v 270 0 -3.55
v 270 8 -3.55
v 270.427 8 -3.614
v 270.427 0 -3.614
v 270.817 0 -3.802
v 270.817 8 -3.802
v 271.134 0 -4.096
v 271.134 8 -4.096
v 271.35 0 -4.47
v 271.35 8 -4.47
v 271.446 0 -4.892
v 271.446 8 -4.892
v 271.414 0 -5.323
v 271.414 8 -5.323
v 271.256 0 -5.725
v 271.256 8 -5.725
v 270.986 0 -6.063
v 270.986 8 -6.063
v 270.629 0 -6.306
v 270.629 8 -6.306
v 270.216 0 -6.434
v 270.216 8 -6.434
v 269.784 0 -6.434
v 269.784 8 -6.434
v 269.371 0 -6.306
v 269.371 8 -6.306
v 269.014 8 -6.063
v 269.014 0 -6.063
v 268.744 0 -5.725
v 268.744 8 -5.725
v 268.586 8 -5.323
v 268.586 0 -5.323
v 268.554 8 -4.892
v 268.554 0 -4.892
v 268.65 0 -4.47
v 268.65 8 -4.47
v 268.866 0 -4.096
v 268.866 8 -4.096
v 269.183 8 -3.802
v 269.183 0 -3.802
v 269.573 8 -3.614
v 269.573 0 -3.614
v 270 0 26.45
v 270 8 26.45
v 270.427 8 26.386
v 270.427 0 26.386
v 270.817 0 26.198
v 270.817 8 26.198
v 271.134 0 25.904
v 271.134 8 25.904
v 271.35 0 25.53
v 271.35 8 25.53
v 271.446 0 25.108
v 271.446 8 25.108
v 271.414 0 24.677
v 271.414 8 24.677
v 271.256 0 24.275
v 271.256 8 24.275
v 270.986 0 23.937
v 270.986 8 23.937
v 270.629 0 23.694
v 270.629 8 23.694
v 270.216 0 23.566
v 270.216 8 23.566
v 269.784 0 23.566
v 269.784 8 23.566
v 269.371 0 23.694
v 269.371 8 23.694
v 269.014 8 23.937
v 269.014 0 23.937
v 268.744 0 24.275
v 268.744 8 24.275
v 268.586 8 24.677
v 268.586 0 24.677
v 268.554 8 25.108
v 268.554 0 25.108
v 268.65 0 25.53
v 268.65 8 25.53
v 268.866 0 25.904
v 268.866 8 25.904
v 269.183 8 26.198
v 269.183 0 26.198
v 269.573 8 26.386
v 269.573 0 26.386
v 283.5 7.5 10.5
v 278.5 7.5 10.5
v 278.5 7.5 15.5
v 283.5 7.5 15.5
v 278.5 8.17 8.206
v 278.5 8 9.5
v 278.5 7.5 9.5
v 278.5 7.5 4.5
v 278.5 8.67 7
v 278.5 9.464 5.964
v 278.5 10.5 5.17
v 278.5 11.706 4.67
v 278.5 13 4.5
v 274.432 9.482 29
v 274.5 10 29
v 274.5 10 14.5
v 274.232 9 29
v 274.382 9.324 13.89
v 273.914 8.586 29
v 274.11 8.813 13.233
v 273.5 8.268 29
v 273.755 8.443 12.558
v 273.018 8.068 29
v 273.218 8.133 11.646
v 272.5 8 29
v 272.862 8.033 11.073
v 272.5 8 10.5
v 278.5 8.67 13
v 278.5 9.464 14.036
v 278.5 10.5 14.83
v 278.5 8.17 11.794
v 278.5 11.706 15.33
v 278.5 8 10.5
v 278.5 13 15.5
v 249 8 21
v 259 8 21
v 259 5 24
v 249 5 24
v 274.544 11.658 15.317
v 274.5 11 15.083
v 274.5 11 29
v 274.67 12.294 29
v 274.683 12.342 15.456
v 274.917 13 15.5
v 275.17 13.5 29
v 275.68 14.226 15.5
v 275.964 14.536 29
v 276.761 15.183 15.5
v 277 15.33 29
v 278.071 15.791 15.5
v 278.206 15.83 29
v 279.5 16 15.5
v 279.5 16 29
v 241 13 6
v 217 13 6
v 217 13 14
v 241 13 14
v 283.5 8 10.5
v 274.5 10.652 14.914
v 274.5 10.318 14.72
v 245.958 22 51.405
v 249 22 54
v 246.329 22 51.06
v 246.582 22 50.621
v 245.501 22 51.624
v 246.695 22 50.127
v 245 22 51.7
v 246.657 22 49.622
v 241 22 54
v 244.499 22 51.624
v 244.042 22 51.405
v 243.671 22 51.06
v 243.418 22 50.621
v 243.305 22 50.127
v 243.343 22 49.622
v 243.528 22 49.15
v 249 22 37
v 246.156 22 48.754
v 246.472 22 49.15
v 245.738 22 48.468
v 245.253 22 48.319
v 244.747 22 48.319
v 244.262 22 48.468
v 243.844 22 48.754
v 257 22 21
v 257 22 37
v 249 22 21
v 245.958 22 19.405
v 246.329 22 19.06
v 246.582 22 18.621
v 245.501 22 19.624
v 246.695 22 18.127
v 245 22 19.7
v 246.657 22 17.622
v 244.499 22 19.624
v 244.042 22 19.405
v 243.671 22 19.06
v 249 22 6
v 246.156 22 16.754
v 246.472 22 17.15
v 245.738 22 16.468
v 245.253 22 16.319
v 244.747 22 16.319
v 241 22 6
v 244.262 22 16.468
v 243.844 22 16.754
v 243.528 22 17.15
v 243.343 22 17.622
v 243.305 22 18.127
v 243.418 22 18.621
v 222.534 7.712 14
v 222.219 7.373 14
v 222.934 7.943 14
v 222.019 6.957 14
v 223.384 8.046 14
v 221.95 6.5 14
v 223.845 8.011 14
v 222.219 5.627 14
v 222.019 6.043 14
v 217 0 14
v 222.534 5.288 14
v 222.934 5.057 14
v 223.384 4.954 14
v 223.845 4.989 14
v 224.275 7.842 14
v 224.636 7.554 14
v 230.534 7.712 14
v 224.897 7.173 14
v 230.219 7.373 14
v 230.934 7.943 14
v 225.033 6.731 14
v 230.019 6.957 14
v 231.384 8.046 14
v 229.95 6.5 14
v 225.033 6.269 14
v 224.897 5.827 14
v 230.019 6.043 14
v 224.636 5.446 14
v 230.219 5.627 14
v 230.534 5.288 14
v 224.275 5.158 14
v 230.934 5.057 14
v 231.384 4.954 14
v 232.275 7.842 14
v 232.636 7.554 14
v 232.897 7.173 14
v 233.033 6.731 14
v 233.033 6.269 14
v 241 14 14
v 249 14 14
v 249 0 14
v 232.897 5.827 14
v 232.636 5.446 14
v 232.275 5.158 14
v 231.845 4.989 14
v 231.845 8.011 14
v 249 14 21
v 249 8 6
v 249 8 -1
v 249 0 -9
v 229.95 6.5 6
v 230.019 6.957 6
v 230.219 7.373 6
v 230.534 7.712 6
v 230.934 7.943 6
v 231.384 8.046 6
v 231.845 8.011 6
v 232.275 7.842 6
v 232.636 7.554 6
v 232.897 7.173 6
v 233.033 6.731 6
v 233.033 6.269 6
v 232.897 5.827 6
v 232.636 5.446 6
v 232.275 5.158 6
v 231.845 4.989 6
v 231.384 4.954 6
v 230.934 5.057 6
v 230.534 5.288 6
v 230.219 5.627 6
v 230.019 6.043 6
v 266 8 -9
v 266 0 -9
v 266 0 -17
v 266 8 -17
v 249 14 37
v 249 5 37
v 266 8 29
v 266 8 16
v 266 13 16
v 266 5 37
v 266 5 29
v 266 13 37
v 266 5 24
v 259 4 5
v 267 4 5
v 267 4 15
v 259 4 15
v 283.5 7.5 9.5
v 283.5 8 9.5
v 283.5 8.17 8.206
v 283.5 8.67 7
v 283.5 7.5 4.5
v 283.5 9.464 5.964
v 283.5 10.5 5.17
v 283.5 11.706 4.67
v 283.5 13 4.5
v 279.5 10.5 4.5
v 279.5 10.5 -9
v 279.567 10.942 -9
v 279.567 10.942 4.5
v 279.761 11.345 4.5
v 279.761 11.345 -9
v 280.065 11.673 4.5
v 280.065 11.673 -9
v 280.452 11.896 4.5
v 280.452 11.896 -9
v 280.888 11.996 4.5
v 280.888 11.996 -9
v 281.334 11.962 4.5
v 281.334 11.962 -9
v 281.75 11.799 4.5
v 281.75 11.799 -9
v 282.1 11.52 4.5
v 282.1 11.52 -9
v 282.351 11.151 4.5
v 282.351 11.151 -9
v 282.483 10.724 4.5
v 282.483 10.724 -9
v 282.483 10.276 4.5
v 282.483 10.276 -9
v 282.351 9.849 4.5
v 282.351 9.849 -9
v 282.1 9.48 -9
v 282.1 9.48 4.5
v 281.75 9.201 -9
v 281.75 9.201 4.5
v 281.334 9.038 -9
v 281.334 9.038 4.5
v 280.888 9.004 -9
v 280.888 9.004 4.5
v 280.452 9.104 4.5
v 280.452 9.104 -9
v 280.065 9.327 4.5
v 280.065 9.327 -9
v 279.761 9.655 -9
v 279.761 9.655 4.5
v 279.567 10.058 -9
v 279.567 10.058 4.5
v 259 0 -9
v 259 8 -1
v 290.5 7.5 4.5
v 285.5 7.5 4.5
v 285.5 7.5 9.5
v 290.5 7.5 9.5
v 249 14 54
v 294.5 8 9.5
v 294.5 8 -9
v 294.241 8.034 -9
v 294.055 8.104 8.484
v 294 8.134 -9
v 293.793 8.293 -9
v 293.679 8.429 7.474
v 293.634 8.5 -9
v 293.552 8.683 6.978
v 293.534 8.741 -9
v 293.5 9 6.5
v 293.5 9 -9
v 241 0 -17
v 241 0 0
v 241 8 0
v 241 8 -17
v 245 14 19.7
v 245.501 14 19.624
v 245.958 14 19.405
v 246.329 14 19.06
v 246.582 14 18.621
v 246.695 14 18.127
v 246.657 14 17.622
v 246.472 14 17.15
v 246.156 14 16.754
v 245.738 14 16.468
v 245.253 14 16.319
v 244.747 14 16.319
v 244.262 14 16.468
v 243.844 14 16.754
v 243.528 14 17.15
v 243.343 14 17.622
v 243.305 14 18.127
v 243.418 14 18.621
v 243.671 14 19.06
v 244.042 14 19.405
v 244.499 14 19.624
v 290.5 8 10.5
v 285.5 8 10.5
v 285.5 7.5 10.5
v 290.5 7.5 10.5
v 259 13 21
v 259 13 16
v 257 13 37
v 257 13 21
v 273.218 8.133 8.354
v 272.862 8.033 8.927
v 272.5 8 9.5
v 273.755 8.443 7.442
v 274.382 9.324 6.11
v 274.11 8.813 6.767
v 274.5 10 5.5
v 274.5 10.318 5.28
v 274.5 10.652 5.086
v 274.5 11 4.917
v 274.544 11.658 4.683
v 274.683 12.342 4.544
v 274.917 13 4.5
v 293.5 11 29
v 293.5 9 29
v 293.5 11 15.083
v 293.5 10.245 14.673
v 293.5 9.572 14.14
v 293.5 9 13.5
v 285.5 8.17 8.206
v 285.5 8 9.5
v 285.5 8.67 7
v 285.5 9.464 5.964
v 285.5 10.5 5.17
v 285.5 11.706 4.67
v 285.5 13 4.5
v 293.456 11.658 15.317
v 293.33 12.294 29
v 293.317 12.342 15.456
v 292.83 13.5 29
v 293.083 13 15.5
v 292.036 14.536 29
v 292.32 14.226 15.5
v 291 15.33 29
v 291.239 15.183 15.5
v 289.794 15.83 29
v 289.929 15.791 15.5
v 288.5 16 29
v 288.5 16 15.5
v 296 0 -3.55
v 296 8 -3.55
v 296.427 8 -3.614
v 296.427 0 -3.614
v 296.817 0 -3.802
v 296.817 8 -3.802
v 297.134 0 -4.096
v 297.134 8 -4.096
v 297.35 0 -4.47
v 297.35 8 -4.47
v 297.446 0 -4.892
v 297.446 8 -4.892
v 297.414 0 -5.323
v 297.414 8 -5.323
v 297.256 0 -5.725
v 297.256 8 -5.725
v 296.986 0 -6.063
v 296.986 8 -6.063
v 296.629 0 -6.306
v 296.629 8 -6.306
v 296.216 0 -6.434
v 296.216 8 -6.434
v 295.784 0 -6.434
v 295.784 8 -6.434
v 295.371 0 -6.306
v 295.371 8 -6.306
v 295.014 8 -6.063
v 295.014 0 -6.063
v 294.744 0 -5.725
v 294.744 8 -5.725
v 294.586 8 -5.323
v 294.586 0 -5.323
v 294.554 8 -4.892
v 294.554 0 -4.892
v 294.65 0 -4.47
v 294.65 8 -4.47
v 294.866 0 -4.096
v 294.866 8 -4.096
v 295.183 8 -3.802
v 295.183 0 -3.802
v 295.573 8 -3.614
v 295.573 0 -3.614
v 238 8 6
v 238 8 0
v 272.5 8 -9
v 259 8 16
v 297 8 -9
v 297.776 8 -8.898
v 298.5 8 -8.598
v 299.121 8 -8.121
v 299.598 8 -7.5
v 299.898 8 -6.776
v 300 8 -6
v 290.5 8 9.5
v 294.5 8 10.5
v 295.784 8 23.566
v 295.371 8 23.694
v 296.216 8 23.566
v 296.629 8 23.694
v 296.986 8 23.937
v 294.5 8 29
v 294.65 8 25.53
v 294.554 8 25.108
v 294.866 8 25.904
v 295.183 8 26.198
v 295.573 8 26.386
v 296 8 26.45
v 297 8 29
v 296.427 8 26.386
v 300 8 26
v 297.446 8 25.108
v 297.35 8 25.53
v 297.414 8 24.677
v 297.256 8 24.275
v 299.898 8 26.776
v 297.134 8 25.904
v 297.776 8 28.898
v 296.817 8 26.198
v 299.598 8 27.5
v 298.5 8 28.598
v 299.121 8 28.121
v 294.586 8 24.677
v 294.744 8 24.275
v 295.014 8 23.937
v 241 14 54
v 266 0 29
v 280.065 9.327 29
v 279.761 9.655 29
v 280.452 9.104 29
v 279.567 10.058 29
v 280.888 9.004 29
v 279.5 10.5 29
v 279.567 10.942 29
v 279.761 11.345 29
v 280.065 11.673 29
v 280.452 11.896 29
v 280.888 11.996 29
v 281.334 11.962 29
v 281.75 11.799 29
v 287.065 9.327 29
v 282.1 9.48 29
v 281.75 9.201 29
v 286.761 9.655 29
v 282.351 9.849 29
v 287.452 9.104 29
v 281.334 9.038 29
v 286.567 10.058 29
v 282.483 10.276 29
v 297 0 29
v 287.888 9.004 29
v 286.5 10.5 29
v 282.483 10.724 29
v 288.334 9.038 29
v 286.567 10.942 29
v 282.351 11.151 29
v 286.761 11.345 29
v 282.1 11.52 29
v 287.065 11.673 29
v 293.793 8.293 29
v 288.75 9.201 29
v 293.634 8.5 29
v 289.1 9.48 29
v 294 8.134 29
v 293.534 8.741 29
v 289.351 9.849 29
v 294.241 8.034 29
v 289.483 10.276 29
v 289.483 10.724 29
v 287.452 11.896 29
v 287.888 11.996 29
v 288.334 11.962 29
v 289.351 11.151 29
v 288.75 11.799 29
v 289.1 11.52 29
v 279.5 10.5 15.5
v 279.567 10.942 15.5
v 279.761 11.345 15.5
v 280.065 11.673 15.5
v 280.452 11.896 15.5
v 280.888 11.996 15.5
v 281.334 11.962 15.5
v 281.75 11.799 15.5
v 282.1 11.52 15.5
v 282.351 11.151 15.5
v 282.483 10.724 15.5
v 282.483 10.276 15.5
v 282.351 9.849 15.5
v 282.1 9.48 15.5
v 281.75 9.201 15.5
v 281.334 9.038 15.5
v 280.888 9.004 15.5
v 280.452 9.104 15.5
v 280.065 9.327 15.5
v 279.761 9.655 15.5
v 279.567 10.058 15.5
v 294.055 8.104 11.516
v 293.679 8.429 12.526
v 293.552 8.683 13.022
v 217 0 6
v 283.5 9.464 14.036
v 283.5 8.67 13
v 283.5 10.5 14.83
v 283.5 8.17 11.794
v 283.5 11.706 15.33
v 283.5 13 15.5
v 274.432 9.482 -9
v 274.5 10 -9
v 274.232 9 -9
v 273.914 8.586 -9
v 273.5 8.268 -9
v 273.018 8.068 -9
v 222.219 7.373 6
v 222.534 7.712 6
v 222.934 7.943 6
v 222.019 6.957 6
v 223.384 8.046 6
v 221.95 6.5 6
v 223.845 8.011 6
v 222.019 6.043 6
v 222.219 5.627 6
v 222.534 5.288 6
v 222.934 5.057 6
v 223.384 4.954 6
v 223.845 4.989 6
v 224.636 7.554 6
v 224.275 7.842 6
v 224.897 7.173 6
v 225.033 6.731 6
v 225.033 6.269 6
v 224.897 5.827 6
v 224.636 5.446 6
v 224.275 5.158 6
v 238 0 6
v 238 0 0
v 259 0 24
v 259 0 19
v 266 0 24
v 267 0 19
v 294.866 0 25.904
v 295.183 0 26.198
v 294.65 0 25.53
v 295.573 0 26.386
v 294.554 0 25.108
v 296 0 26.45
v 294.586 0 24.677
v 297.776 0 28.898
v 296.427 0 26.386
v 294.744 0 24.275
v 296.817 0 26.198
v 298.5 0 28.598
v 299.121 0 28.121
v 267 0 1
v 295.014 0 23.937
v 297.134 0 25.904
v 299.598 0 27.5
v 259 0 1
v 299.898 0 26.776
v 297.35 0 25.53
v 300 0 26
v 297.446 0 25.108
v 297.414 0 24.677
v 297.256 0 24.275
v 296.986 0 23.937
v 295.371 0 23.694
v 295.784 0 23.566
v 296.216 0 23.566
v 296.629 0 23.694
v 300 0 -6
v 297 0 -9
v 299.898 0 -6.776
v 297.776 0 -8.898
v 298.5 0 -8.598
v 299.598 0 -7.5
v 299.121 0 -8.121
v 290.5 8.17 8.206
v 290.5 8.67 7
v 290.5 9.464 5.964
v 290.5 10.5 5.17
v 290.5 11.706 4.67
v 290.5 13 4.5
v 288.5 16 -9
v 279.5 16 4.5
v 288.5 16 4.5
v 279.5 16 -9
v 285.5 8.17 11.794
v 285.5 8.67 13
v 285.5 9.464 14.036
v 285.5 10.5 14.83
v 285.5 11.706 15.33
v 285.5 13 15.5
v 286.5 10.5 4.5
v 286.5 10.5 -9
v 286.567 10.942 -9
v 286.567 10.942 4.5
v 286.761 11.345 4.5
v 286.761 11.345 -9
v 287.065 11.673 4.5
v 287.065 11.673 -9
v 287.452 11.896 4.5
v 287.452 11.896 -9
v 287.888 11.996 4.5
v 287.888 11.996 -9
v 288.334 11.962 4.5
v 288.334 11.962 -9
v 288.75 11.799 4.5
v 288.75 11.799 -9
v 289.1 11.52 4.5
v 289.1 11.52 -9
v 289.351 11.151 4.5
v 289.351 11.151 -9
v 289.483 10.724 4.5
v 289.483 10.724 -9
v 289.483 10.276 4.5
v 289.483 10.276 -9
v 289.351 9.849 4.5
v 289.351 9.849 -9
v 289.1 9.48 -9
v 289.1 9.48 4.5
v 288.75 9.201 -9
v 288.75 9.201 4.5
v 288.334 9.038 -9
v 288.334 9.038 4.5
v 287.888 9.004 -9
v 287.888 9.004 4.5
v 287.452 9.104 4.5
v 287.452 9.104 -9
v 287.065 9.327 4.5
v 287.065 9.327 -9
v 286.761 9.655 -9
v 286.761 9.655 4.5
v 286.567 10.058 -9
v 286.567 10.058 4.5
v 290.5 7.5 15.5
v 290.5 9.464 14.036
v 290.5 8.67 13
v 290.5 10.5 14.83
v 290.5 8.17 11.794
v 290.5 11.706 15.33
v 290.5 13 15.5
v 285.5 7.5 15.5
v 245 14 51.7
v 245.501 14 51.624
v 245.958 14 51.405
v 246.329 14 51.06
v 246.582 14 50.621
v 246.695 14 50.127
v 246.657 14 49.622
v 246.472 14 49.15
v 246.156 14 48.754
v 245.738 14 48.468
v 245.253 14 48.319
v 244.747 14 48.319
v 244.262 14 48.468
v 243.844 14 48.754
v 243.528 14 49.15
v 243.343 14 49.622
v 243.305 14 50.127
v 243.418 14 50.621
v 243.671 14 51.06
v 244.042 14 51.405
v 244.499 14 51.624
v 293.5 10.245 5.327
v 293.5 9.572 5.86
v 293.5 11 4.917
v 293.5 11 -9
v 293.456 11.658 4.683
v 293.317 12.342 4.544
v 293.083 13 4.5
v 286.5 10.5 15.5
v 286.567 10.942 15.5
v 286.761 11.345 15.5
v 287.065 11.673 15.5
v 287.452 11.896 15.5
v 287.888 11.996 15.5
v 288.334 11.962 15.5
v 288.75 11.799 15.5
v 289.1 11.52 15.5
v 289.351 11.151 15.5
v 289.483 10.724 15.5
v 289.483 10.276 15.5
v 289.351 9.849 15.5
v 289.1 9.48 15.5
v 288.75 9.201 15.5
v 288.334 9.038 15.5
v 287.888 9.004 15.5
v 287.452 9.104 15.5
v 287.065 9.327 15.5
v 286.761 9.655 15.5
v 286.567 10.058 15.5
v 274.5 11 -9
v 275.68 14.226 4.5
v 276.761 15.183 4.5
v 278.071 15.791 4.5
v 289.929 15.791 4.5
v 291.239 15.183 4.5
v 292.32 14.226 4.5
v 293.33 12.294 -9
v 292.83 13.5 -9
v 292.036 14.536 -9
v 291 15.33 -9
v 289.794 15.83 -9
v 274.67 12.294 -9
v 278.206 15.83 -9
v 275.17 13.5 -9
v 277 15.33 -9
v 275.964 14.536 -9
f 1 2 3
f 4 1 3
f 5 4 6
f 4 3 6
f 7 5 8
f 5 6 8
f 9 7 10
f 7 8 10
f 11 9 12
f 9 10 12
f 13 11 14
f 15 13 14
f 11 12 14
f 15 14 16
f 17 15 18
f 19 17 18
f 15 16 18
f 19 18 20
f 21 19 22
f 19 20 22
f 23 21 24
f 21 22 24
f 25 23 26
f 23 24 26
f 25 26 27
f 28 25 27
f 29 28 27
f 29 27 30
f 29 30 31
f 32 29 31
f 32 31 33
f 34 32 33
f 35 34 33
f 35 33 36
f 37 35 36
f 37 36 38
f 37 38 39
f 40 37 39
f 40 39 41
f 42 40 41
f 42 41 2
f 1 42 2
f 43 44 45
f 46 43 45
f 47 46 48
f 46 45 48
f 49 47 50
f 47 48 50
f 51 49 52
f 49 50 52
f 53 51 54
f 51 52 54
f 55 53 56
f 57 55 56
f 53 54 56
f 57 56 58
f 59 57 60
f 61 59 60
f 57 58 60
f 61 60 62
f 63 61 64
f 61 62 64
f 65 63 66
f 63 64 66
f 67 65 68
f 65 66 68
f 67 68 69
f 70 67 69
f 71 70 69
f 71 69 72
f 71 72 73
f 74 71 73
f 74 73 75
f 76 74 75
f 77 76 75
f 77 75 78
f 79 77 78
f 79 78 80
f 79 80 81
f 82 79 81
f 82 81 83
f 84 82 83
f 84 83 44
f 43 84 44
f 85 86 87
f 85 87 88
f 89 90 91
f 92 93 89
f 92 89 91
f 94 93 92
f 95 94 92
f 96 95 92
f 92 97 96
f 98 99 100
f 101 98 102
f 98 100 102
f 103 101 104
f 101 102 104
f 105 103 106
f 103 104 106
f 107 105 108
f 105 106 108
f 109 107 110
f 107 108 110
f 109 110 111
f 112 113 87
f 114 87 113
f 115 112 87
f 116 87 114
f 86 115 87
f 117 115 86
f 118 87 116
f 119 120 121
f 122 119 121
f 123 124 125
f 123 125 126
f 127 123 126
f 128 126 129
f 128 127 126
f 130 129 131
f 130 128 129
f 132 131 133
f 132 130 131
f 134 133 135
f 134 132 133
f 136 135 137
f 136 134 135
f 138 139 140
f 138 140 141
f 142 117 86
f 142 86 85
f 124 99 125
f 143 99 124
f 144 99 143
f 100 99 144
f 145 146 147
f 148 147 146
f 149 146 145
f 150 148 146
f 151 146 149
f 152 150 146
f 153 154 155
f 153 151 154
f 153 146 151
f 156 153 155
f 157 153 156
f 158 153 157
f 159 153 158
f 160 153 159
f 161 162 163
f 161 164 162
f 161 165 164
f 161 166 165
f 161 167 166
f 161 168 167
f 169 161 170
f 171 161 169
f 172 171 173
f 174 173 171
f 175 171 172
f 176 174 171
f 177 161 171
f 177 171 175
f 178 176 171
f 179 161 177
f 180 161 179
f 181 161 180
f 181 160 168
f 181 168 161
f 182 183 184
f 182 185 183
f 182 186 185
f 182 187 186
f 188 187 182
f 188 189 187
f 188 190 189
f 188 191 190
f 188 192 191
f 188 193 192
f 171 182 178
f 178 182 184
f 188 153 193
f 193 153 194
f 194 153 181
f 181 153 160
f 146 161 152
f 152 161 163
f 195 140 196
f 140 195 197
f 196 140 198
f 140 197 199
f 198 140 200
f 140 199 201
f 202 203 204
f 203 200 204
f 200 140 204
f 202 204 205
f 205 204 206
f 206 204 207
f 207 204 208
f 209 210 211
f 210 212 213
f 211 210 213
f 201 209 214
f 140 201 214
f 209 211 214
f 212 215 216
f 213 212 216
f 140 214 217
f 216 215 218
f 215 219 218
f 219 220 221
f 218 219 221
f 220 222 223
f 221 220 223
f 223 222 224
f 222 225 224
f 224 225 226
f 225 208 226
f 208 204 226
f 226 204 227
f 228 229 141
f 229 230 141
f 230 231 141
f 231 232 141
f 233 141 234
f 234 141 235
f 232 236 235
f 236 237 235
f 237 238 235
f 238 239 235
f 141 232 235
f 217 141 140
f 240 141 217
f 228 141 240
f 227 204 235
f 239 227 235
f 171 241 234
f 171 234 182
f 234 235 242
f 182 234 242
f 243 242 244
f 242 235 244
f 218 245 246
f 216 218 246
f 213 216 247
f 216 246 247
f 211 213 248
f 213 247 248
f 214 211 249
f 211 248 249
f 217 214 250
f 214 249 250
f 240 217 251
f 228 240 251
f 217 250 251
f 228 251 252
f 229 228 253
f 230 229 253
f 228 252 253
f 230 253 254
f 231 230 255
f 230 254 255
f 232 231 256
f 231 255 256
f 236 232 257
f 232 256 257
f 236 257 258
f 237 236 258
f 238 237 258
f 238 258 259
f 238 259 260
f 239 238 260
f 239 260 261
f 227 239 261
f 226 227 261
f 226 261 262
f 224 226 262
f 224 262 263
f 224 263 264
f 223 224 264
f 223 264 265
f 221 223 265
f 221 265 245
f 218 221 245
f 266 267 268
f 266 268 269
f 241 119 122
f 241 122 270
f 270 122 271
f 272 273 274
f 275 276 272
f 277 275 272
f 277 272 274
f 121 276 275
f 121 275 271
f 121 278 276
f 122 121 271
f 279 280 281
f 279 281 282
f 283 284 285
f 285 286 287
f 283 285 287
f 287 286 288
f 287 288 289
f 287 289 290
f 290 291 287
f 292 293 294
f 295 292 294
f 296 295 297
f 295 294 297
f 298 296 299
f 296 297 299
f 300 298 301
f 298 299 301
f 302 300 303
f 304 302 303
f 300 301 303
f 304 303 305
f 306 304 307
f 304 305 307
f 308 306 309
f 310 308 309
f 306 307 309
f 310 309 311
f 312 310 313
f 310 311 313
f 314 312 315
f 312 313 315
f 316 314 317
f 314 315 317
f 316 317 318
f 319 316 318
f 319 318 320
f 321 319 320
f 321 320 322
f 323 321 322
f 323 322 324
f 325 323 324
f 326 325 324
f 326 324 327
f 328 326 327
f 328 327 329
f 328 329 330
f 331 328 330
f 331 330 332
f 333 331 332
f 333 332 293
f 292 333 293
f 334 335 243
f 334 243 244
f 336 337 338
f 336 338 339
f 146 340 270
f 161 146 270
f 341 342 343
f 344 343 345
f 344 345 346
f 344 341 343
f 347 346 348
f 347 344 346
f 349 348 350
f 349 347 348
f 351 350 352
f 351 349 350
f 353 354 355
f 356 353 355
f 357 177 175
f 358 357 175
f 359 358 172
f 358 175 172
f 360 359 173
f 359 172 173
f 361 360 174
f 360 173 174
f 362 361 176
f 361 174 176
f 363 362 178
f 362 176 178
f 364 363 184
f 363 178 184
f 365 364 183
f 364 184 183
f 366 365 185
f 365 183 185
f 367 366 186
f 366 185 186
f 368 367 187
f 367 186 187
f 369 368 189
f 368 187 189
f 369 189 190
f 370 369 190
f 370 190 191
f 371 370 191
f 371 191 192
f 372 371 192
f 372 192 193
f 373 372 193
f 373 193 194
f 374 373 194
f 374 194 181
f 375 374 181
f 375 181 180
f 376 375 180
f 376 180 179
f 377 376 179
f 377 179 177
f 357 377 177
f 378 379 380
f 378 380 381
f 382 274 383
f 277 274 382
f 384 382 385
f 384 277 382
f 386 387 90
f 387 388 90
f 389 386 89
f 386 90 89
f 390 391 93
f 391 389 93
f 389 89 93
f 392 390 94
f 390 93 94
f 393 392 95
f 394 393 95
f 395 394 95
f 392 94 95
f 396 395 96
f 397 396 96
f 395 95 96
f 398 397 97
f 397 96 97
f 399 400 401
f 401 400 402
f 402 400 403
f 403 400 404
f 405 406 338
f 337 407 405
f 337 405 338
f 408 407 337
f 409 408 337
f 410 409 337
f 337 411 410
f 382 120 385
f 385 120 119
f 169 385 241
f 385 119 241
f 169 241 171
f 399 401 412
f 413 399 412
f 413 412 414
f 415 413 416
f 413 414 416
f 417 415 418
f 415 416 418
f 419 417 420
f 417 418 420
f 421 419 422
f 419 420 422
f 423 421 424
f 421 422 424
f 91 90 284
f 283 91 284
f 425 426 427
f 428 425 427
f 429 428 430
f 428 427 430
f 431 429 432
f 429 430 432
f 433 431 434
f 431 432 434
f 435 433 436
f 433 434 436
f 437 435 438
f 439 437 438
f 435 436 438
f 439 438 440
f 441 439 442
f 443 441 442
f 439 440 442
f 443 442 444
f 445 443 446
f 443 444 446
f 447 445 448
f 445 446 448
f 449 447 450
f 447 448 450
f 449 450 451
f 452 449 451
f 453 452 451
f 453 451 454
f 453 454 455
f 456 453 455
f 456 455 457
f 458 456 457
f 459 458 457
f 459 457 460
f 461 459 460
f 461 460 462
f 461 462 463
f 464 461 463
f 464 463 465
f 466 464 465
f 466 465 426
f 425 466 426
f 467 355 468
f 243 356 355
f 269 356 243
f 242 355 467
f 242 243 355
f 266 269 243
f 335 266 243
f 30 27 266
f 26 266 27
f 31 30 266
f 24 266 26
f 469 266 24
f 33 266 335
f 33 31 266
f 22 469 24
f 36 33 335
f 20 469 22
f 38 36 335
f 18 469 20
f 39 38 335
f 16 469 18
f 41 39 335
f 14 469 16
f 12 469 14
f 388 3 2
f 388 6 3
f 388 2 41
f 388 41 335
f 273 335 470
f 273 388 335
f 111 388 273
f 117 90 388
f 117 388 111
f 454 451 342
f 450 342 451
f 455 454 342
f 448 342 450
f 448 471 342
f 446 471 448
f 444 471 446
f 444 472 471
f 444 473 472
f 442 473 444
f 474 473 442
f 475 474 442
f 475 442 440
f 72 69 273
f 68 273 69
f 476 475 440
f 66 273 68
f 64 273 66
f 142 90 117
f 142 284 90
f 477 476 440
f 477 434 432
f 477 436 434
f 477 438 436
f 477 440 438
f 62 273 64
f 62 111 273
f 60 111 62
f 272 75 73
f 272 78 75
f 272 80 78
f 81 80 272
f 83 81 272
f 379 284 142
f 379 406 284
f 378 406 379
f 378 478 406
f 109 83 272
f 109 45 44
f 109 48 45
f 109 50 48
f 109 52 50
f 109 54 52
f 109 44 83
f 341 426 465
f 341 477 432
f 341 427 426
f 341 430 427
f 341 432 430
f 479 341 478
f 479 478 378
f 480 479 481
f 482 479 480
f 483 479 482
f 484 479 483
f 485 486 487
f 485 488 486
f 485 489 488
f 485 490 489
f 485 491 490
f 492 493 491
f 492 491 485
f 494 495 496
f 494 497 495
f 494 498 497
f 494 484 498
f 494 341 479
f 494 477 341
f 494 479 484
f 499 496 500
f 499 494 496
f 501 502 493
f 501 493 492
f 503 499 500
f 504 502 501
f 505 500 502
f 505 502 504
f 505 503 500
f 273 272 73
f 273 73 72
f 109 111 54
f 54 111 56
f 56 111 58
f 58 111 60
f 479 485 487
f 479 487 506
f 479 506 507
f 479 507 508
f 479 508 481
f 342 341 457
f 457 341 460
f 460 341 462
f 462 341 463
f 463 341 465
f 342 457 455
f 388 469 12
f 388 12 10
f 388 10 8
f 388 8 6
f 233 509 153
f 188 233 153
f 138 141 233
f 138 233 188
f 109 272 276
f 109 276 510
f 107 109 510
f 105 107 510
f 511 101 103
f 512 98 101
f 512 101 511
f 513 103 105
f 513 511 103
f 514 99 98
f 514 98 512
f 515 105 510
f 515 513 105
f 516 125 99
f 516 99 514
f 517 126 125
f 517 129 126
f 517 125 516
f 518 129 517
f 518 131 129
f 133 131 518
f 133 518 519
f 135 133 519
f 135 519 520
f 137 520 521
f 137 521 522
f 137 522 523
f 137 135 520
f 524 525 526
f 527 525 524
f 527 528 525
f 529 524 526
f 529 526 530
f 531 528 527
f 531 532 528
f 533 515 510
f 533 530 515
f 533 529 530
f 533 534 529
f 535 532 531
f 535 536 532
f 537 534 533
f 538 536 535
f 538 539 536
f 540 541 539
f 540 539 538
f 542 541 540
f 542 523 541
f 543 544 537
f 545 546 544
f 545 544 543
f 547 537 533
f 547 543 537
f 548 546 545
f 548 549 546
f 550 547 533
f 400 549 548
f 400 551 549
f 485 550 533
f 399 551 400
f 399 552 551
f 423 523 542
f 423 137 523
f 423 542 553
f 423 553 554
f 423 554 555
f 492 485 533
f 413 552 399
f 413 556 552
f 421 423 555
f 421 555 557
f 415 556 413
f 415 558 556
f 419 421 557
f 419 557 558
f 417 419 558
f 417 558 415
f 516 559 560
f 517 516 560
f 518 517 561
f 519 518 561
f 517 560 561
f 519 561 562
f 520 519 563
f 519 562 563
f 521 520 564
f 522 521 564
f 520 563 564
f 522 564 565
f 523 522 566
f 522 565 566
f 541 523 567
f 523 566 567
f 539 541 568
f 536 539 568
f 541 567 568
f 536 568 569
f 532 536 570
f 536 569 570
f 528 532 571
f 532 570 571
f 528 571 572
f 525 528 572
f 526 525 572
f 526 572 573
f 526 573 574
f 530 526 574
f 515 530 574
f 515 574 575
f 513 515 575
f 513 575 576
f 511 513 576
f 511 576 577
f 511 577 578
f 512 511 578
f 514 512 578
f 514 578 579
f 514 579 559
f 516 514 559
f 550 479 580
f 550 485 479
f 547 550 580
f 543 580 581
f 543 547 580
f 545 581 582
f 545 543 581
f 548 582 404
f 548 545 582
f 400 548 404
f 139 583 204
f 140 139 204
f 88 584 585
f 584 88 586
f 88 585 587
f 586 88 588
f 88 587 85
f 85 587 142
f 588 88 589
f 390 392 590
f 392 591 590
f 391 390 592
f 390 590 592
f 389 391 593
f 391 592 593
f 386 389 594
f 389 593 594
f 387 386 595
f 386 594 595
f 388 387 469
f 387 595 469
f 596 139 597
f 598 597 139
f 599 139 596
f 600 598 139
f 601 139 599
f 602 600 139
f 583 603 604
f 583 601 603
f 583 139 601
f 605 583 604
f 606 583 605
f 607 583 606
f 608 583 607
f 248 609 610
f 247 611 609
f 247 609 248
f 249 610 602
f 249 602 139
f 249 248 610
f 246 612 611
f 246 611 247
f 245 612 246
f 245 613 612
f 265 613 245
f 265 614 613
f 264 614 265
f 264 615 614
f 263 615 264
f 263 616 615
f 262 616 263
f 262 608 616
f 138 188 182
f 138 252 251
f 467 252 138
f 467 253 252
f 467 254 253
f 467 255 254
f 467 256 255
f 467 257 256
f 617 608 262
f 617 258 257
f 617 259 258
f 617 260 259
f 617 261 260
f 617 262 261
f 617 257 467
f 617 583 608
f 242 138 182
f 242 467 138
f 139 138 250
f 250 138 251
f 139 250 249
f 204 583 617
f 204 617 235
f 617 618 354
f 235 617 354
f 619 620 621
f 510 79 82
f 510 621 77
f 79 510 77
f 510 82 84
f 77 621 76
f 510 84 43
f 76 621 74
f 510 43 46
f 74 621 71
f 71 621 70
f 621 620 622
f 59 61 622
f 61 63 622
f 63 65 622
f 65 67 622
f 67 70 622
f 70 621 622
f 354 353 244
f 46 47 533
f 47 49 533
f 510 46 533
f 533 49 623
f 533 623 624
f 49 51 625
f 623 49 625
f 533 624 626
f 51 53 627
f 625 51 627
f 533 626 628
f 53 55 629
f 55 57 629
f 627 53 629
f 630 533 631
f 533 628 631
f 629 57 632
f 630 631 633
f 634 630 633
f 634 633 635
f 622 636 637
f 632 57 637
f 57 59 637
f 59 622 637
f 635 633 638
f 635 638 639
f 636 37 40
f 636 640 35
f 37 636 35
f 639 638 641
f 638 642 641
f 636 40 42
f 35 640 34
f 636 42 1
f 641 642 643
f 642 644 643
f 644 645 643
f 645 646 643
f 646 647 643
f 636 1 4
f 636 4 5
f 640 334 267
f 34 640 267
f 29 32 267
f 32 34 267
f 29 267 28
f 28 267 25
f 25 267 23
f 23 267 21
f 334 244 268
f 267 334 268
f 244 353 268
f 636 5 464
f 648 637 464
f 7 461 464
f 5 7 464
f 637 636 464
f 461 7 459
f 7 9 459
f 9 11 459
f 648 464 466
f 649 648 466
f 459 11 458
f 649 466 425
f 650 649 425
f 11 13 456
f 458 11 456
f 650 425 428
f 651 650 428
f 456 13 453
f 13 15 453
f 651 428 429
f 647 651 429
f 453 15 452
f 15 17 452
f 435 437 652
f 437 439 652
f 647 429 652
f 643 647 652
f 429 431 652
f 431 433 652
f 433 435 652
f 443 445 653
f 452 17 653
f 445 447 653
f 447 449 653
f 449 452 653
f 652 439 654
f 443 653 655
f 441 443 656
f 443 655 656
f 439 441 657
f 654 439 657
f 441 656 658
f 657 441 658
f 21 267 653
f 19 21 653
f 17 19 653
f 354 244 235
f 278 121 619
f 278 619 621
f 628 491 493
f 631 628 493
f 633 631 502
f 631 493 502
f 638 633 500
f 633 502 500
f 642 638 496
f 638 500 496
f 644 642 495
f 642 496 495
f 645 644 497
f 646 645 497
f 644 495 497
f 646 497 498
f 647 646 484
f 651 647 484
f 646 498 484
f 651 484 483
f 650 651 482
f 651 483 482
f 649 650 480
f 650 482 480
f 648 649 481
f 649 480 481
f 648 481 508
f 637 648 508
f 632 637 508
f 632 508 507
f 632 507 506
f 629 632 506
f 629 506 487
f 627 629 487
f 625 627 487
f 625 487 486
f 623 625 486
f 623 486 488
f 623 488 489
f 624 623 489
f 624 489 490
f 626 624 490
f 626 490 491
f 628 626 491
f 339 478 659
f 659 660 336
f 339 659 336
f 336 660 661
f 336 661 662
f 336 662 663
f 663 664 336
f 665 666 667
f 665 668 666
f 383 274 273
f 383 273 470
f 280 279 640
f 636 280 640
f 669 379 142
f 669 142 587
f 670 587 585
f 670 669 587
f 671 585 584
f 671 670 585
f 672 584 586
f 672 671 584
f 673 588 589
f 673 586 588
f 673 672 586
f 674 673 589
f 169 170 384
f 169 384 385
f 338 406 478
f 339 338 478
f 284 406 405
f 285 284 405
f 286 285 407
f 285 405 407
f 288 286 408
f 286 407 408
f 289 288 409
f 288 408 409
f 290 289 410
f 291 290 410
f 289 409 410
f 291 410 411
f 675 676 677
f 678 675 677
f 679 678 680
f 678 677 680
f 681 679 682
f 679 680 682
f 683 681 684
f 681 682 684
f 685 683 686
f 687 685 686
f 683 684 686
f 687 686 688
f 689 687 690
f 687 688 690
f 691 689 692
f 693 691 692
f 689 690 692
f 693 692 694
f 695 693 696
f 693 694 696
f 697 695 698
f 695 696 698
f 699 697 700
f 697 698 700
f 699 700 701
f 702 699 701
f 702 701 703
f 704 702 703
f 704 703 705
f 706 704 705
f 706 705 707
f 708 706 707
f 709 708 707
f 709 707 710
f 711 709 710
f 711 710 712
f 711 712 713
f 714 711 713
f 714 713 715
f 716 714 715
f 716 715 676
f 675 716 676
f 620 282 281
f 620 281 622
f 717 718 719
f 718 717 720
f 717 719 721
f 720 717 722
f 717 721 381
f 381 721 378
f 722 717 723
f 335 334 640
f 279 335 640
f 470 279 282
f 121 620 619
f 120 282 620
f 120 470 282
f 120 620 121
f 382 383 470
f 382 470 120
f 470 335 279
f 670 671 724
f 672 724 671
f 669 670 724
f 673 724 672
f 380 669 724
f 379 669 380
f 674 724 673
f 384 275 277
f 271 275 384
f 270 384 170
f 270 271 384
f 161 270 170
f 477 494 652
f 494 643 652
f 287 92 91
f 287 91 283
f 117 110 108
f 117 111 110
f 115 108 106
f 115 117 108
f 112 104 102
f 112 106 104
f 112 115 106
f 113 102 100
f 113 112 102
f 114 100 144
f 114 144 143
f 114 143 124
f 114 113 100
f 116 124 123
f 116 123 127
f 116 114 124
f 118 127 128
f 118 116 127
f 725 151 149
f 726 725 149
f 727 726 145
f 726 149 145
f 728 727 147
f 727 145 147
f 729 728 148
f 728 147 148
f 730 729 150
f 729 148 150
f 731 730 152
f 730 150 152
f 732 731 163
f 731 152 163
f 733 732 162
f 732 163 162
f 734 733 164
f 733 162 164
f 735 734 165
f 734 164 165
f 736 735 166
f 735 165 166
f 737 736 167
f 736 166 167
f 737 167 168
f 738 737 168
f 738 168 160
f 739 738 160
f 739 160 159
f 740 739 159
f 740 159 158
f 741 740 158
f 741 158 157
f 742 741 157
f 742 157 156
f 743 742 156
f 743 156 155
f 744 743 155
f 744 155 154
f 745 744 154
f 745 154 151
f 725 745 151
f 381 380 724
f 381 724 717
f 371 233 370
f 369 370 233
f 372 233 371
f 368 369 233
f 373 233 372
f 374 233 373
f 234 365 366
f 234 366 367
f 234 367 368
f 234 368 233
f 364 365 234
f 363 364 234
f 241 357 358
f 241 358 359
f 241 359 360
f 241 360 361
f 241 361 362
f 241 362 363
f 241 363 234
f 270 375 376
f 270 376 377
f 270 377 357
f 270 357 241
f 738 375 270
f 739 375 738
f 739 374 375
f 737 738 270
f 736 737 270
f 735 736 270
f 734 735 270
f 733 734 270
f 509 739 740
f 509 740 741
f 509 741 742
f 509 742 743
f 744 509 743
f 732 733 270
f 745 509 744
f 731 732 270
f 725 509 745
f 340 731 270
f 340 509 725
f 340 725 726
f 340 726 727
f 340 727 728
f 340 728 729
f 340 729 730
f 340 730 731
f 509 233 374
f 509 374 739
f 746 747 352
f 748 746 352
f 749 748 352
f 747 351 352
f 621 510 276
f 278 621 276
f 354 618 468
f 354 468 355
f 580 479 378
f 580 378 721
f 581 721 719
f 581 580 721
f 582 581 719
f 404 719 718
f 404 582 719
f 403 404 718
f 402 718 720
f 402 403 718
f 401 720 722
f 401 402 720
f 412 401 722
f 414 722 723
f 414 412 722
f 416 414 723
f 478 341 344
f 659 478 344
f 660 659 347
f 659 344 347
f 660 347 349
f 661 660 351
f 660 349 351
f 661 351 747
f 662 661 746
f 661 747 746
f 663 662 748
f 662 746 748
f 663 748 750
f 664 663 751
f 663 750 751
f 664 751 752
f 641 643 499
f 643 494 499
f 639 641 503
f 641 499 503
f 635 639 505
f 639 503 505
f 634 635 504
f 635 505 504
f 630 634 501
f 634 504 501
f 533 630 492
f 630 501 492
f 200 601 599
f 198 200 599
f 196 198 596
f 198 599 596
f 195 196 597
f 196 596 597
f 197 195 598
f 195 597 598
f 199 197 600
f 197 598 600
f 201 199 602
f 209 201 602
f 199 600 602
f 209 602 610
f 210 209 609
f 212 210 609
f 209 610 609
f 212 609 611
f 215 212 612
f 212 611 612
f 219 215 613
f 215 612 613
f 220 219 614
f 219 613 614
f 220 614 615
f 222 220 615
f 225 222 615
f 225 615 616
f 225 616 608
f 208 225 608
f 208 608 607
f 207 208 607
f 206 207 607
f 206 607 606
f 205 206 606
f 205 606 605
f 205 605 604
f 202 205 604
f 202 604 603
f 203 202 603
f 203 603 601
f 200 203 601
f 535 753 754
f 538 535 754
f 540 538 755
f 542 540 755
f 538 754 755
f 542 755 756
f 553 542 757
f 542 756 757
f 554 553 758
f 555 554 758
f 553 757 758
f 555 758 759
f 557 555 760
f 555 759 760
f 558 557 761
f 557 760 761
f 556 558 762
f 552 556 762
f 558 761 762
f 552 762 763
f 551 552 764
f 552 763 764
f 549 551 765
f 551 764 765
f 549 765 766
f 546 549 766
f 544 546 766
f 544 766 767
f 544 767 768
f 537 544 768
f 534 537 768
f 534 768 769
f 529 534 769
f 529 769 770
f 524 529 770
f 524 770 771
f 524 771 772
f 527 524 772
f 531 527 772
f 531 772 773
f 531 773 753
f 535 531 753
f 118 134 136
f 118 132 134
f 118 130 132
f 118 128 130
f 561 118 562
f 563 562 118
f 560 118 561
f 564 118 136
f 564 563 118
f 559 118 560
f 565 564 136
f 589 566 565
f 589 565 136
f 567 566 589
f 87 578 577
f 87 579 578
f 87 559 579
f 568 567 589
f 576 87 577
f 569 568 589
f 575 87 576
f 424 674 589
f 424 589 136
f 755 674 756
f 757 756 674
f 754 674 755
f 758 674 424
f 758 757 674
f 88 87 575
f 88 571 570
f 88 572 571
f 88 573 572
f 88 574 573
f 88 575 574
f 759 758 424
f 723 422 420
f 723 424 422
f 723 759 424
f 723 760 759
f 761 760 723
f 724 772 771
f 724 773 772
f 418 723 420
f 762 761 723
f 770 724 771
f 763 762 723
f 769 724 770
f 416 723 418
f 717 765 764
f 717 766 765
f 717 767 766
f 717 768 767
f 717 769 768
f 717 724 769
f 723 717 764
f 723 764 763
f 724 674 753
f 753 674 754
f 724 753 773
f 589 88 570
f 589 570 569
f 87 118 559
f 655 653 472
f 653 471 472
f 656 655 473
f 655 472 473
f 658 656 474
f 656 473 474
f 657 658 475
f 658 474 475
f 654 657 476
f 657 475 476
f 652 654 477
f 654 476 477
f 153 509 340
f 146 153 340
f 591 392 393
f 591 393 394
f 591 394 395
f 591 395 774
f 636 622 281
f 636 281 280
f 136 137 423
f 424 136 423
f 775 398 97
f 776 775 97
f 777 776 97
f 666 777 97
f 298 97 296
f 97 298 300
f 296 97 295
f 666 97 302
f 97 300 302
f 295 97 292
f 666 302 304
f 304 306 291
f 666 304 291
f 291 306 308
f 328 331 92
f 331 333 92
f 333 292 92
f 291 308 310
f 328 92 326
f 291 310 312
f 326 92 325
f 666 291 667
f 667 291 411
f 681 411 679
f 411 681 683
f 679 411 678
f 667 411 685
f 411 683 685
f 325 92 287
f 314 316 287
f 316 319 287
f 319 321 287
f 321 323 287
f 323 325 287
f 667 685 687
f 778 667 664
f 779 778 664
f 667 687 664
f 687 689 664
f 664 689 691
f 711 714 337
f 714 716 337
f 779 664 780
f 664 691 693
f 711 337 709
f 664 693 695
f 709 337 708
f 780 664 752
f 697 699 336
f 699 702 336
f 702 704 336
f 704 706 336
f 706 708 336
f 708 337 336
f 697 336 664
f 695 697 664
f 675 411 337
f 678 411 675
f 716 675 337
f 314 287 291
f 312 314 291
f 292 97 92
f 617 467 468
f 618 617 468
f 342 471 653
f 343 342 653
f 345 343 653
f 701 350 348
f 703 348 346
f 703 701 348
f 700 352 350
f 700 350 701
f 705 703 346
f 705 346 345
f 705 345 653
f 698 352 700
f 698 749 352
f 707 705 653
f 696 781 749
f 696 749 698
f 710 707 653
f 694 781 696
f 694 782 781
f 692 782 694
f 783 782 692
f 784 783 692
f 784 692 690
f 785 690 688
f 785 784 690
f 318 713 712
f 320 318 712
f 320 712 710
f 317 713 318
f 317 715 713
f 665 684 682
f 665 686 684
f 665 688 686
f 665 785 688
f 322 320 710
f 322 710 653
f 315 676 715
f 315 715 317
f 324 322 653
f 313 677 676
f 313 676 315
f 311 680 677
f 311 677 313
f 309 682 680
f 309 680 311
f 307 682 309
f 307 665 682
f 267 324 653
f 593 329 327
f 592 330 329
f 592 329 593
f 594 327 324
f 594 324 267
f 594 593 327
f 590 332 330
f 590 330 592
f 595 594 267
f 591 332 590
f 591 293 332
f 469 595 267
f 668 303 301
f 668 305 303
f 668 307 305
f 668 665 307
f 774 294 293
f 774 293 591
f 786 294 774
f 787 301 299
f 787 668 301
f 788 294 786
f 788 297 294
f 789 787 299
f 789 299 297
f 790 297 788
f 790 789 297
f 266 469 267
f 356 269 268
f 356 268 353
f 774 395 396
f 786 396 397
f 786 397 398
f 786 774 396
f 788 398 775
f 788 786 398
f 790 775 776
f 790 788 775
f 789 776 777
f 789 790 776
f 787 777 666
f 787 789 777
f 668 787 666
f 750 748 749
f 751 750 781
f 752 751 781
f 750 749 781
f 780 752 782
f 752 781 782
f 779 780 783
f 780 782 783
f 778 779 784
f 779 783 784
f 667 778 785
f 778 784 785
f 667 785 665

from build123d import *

# Parameters (mm, degrees)
SKETCH1_W                 = 300
SKETCH1_H                 = 20
BOSS_EXTRUDE1_DEPTH       = 8
SKETCH2_W                 = 34
SKETCH2_H                 = 8
BOSS_EXTRUDE2_DEPTH       = 9
SKETCH3_W                 = 34
SKETCH3_H                 = 8
BOSS_EXTRUDE3_DEPTH       = 9
SKETCH4_R                 = 1.45
CUT_EXTRUDE1_DEPTH        = 302.504560496
SKETCH5_W                 = 25
SKETCH5_H                 = 8
BOSS_EXTRUDE4_DEPTH       = 17
SKETCH6_W                 = 25
SKETCH6_H                 = 8
BOSS_EXTRUDE5_DEPTH       = 17
SKETCH12_W                = 8
SKETCH12_H                = 8
BOSS_EXTRUDE7_DEPTH       = 17
SKETCH18_W                = 20
SKETCH18_H                = 13
BOSS_EXTRUDE10_DEPTH      = 12
SKETCH19_R                = 1.6
CUT_EXTRUDE9_DEPTH        = 20
SKETCH20_W                = 20
SKETCH20_H                = 13
BOSS_EXTRUDE11_DEPTH      = 12
SKETCH21_R                = 1.6
CUT_EXTRUDE10_DEPTH       = 20
SKETCH22_W                = 10
SKETCH22_H                = 38
CUT_EXTRUDE11_DEPTH       = 306.0983448
SKETCH23_W                = 8
SKETCH23_H                = 18
CUT_EXTRUDE12_DEPTH       = 4
BOSS_EXTRUDE12_DEPTH      = 10
BOSS_EXTRUDE13_DEPTH      = 8
SKETCH26_W                = 8
SKETCH26_H                = 48
BOSS_EXTRUDE14_DEPTH      = 14
SKETCH27_W                = 8
SKETCH27_H                = 16
BOSS_EXTRUDE15_DEPTH      = 14
SKETCH28_W                = 8
SKETCH28_H                = 40
CUT_EXTRUDE13_DEPTH       = 14
SKETCH30_W                = 16
SKETCH30_H                = 14
BOSS_EXTRUDE16_DEPTH      = 9
SKETCH31_W                = 17
SKETCH31_H                = 8
CUT_EXTRUDE14_DEPTH       = 5
SKETCH32_W                = 16
SKETCH32_H                = 9
CUT_EXTRUDE15_DEPTH       = 9
CUT_EXTRUDE16_DEPTH       = 10
SKETCH34_W                = 7
SKETCH34_H                = 5
CUT_EXTRUDE17_DEPTH       = 5
SKETCH35_W                = 7
SKETCH35_H                = 5
BOSS_EXTRUDE17_DEPTH      = 5
SKETCH36_R                = 1.7
CUT_EXTRUDE18_DEPTH       = 307.014705529
SKETCH37_W                = 70
SKETCH37_H                = 8
BOSS_EXTRUDE18_DEPTH      = 5
SKETCH39_W                = 66
SKETCH39_H                = 6
CUT_EXTRUDE19_DEPTH       = 306.14258962
SKETCH40_W                = 20
SKETCH40_H                = 12
BOSS_EXTRUDE19_DEPTH      = 10
BOSS_EXTRUDE20_DEPTH      = 5
BOSS_EXTRUDE20_DEPTH_BACK = 5
SKETCH41_W                = 28
SKETCH41_H                = 12
SKETCH42_R                = 1.5
CUT_EXTRUDE20_DEPTH       = 15
SKETCH43_W                = 20
SKETCH43_H                = 12
BOSS_EXTRUDE21_DEPTH      = 10
BOSS_EXTRUDE22_DEPTH      = 5
BOSS_EXTRUDE22_DEPTH_BACK = 5
SKETCH44_W                = 28
SKETCH44_H                = 12
SKETCH45_R                = 1.5
CUT_EXTRUDE21_DEPTH       = 15
SKETCH49_R                = 1.45
CUT_EXTRUDE23_DEPTH       = 306.190104689
SKETCH50_W                = 99.073016947
SKETCH50_H                = 52.119345881
CUT_EXTRUDE24_DEPTH       = 220
SKETCH51_W                = 21
SKETCH51_H                = 6
CUT_EXTRUDE25_DEPTH       = 306.14258962
SKETCH52_R                = 1.55
CUT_EXTRUDE26_DEPTH       = 305.611227633
FILLET5_R                 = 3
SKETCH54_W                = 19
SKETCH54_H                = 13.5
BOSS_EXTRUDE26_DEPTH      = 8
FILLET6_R                 = 5
SKETCH55_R                = 1.5
CUT_EXTRUDE27_DEPTH       = 308.332067966
FILLET7_R                 = 5
FILLET8_R                 = 1
FILLET9_R                 = 2
SKETCH56_W                = 5
SKETCH56_H                = 5
CUT_EXTRUDE28_DEPTH       = 8.5


with BuildPart() as part:
    # Sketch1 → Boss-Extrude1 (new body)
    with BuildSketch(Plane(origin=(0, 0, 0), x_dir=(1, 0, 0), z_dir=(0, 1, 0))):
        with Locations((150, -10)):
            Rectangle(SKETCH1_W, SKETCH1_H)
    extrude(amount=BOSS_EXTRUDE1_DEPTH)

    # Sketch2 → Boss-Extrude2 (add)
    with BuildSketch(Plane.XY.offset(20)):
        with Locations((17, 4)):
            Rectangle(SKETCH2_W, SKETCH2_H)
        with Locations((283, 4)):
            Rectangle(SKETCH2_W, SKETCH2_H)
    extrude(amount=BOSS_EXTRUDE2_DEPTH)

    # Sketch3 → Boss-Extrude3 (add)
    with BuildSketch(Plane(origin=(0, 0, 0), x_dir=(-1, 0, 0), z_dir=(0, 0, -1))):
        with Locations((-17, 4)):
            Rectangle(SKETCH3_W, SKETCH3_H)
        with Locations((-283, 4)):
            Rectangle(SKETCH3_W, SKETCH3_H)
    extrude(amount=BOSS_EXTRUDE3_DEPTH)

    # Sketch4 → Cut-Extrude1 (cut, through all)
    with BuildSketch(Plane(origin=(0, 8, 0), x_dir=(1, 0, 0), z_dir=(0, 1, 0))):
        with Locations(Location((4, 5, 0), (0, 0, 270))):
            Circle(SKETCH4_R)
        with Locations(Location((30, 5, 0), (0, 0, 270))):
            Circle(SKETCH4_R)
        with Locations(Location((30, -25, 0), (0, 0, 270))):
            Circle(SKETCH4_R)
        with Locations(Location((4, -25, 0), (0, 0, 270))):
            Circle(SKETCH4_R)
        with Locations(Location((296, -25, 0), (0, 0, 270))):
            Circle(SKETCH4_R)
        with Locations(Location((296, 5, 0), (0, 0, 270))):
            Circle(SKETCH4_R)
        with Locations(Location((270, -25, 0), (0, 0, 270))):
            Circle(SKETCH4_R)
        with Locations(Location((270, 5, 0), (0, 0, 270))):
            Circle(SKETCH4_R)
    extrude(amount=-CUT_EXTRUDE1_DEPTH, mode=Mode.SUBTRACT)

    # Sketch5 → Boss-Extrude4 (add)
    with BuildSketch(Plane.XY.offset(20)):
        with Locations((253.5, 4)):
            Rectangle(SKETCH5_W, SKETCH5_H)
    extrude(amount=BOSS_EXTRUDE4_DEPTH)

    # Sketch6 → Boss-Extrude5 (add)
    with BuildSketch(Plane(origin=(0, 0, 0), x_dir=(-1, 0, 0), z_dir=(0, 0, -1))):
        with Locations((-253.5, 4)):
            Rectangle(SKETCH6_W, SKETCH6_H)
    extrude(amount=BOSS_EXTRUDE5_DEPTH)

    # Sketch12 → Boss-Extrude7 (add)
    with BuildSketch(Plane.XY.offset(37)):
        with Locations((245, 4)):
            Rectangle(SKETCH12_W, SKETCH12_H)
    extrude(amount=BOSS_EXTRUDE7_DEPTH)

    # Sketch18 → Boss-Extrude10 (add)
    with BuildSketch(Plane(origin=(0, 0, -9), x_dir=(-1, 0, 0), z_dir=(0, 0, -1))):
        with Locations((-15, 1.5)):
            Rectangle(SKETCH18_W, SKETCH18_H)
    extrude(amount=BOSS_EXTRUDE10_DEPTH)

    # Sketch19 → Cut-Extrude9 (cut)
    with BuildSketch(Plane.ZY.offset(-5)):
        with Locations((-15, 0)):
            Circle(SKETCH19_R)
    extrude(amount=-CUT_EXTRUDE9_DEPTH, mode=Mode.SUBTRACT)

    # Sketch20 → Boss-Extrude11 (add)
    with BuildSketch(Plane.XY.offset(29)):
        with Locations((15, 1.5)):
            Rectangle(SKETCH20_W, SKETCH20_H)
    extrude(amount=BOSS_EXTRUDE11_DEPTH)

    # Sketch21 → Cut-Extrude10 (cut)
    with BuildSketch(Plane.ZY.offset(-5)):
        with Locations((35, 0)):
            Circle(SKETCH21_R)
    extrude(amount=-CUT_EXTRUDE10_DEPTH, mode=Mode.SUBTRACT)

    # Sketch22 → Cut-Extrude11 (cut, through all)
    with BuildSketch(Plane(origin=(0, 8, 0), x_dir=(1, 0, 0), z_dir=(0, 1, 0))):
        with Locations((254, -10)):
            Rectangle(SKETCH22_W, SKETCH22_H)
    extrude(amount=-CUT_EXTRUDE11_DEPTH, mode=Mode.SUBTRACT)

    # Sketch23 → Cut-Extrude12 (cut)
    with BuildSketch(Plane(origin=(0, 0, 0), x_dir=(-1, 0, 0), z_dir=(0, -1, 0))):
        with Locations((-263, -10)):
            Rectangle(SKETCH23_W, SKETCH23_H)
    extrude(amount=-CUT_EXTRUDE12_DEPTH, mode=Mode.SUBTRACT)

    # Sketch24 → Boss-Extrude12 (add)
    with BuildSketch(Plane.ZY.offset(-259)):
        Polygon((-9, 0), (-9, 8), (-1, 8), align=None)
        Polygon((29, 0), (29, 8), (21, 8), align=None)
    extrude(amount=BOSS_EXTRUDE12_DEPTH)

    # Sketch25 → Boss-Extrude13 (add)
    with BuildSketch(Plane.ZY.offset(-267)):
        Polygon((19, 0), (19, 4), (15, 4), align=None)
        Polygon((1, 4), (5, 4), (1, 0), align=None)
    extrude(amount=BOSS_EXTRUDE13_DEPTH)

    # Sketch26 → Boss-Extrude14 (add)
    with BuildSketch(Plane(origin=(0, 8, 0), x_dir=(1, 0, 0), z_dir=(0, 1, 0))):
        with Locations((245, -30)):
            Rectangle(SKETCH26_W, SKETCH26_H)
    extrude(amount=BOSS_EXTRUDE14_DEPTH)

    # Sketch27 → Boss-Extrude15 (add)
    with BuildSketch(Plane(origin=(0, 8, 0), x_dir=(1, 0, 0), z_dir=(0, 1, 0))):
        with Locations((253, -29)):
            Rectangle(SKETCH27_W, SKETCH27_H)
    extrude(amount=BOSS_EXTRUDE15_DEPTH)

    # Sketch28 → Cut-Extrude13 (cut)
    with BuildSketch(Plane.XZ):
        with Locations((245, 34)):
            Rectangle(SKETCH28_W, SKETCH28_H)
    extrude(amount=-CUT_EXTRUDE13_DEPTH, mode=Mode.SUBTRACT)

    # Sketch30 → Boss-Extrude16 (add)
    with BuildSketch(Plane(origin=(257, 0, 0), x_dir=(0, 0, -1), z_dir=(1, 0, 0))):
        with Locations((-29, 15)):
            Rectangle(SKETCH30_W, SKETCH30_H)
    extrude(amount=BOSS_EXTRUDE16_DEPTH)

    # Sketch31 → Cut-Extrude14 (cut)
    with BuildSketch(Plane(origin=(0, 0, 0), x_dir=(-1, 0, 0), z_dir=(0, -1, 0))):
        with Locations((-257.5, -33)):
            Rectangle(SKETCH31_W, SKETCH31_H)
    extrude(amount=-CUT_EXTRUDE14_DEPTH, mode=Mode.SUBTRACT)

    # Sketch32 → Cut-Extrude15 (cut)
    with BuildSketch(Plane(origin=(266, 0, 0), x_dir=(0, 0, -1), z_dir=(1, 0, 0))):
        with Locations((-29, 17.5)):
            Rectangle(SKETCH32_W, SKETCH32_H)
    extrude(amount=-CUT_EXTRUDE15_DEPTH, mode=Mode.SUBTRACT)

    # Sketch33 → Cut-Extrude16 (cut)
    with BuildSketch(Plane.ZY.offset(-249)):
        Polygon((29, 5), (24, 5), (29, 0), align=None)
    extrude(amount=-CUT_EXTRUDE16_DEPTH, mode=Mode.SUBTRACT)

    # Sketch34 → Cut-Extrude17 (cut)
    with BuildSketch(Plane.XY.offset(29)):
        with Locations((262.5, 2.5)):
            Rectangle(SKETCH34_W, SKETCH34_H)
    extrude(amount=-CUT_EXTRUDE17_DEPTH, mode=Mode.SUBTRACT)

    # Sketch35 → Boss-Extrude17 (add)
    with BuildSketch(Plane(origin=(0, 0, 21), x_dir=(-1, 0, 0), z_dir=(0, 0, -1))):
        with Locations((-262.5, 10.5)):
            Rectangle(SKETCH35_W, SKETCH35_H)
    extrude(amount=BOSS_EXTRUDE17_DEPTH)

    # Sketch36 → Cut-Extrude18 (cut, through all)
    with BuildSketch(Plane(origin=(0, 22, 0), x_dir=(1, 0, 0), z_dir=(0, 1, 0))):
        with Locations(Location((245, -50, 0), (0, 0, 270))):
            Circle(SKETCH36_R)
        with Locations(Location((245, -18, 0), (0, 0, 270))):
            Circle(SKETCH36_R)
    extrude(amount=-CUT_EXTRUDE18_DEPTH, mode=Mode.SUBTRACT)

    # Sketch37 → Boss-Extrude18 (add)
    with BuildSketch(Plane(origin=(0, 8, 0), x_dir=(1, 0, 0), z_dir=(0, 1, 0))):
        with Locations((206, -10)):
            Rectangle(SKETCH37_W, SKETCH37_H)
    extrude(amount=BOSS_EXTRUDE18_DEPTH)

    # Sketch39 → Cut-Extrude19 (cut, through all)
    with BuildSketch(Plane(origin=(0, 8, 0), x_dir=(1, 0, 0), z_dir=(0, 1, 0))):
        with Locations((208, -17)):
            Rectangle(SKETCH39_W, SKETCH39_H)
    extrude(amount=-CUT_EXTRUDE19_DEPTH, mode=Mode.SUBTRACT)

    # Sketch40 → Boss-Extrude19 (add)
    with BuildSketch(Plane(origin=(0, 8, 0), x_dir=(1, 0, 0), z_dir=(0, 1, 0))):
        with Locations((15, 15)):
            Rectangle(SKETCH40_W, SKETCH40_H)
    extrude(amount=BOSS_EXTRUDE19_DEPTH)

    # Sketch41 → Boss-Extrude20 (add, two sides: drawn at the far end of the back side and taken through both)
    with BuildSketch(Plane(origin=(0, 18, 0), x_dir=(1, 0, 0), z_dir=(0, 1, 0)).offset(-BOSS_EXTRUDE20_DEPTH_BACK)):
        with Locations((11, 15)):
            Rectangle(SKETCH41_W, SKETCH41_H)
    extrude(amount=BOSS_EXTRUDE20_DEPTH + BOSS_EXTRUDE20_DEPTH_BACK)

    # Sketch42 → Cut-Extrude20 (cut)
    with BuildSketch(Plane.ZY.offset(3)):
        with Locations((-14, 18)):
            Circle(SKETCH42_R)
    extrude(amount=-CUT_EXTRUDE20_DEPTH, mode=Mode.SUBTRACT)

    # Sketch43 → Boss-Extrude21 (add)
    with BuildSketch(Plane(origin=(0, 8, 0), x_dir=(1, 0, 0), z_dir=(0, 1, 0))):
        with Locations((15, -35)):
            Rectangle(SKETCH43_W, SKETCH43_H)
    extrude(amount=BOSS_EXTRUDE21_DEPTH)

    # Sketch44 → Boss-Extrude22 (add, two sides: drawn at the far end of the back side and taken through both)
    with BuildSketch(Plane(origin=(0, 18, 0), x_dir=(1, 0, 0), z_dir=(0, 1, 0)).offset(-BOSS_EXTRUDE22_DEPTH_BACK)):
        with Locations((11, -35)):
            Rectangle(SKETCH44_W, SKETCH44_H)
    extrude(amount=BOSS_EXTRUDE22_DEPTH + BOSS_EXTRUDE22_DEPTH_BACK)

    # Sketch45 → Cut-Extrude21 (cut)
    with BuildSketch(Plane.ZY.offset(3)):
        with Locations((36, 18)):
            Circle(SKETCH45_R)
    extrude(amount=-CUT_EXTRUDE21_DEPTH, mode=Mode.SUBTRACT)

    # Sketch49 → Cut-Extrude23 (cut, through all)
    with BuildSketch(Plane(origin=(0, 8, 0), x_dir=(1, 0, 0), z_dir=(0, 1, 0))):
        with Locations(Location((78, -8, 0), (0, 0, 270))):
            Circle(SKETCH49_R)
        with Locations(Location((78, -12, 0), (0, 0, 270))):
            Circle(SKETCH49_R)
    extrude(amount=-CUT_EXTRUDE23_DEPTH, mode=Mode.SUBTRACT)

    # Sketch50 → Cut-Extrude24 (cut)
    with BuildSketch(Plane.ZY.offset(3)):
        with Locations((14.374840952, 8.537402255)):
            Rectangle(SKETCH50_W, SKETCH50_H)
    extrude(amount=-CUT_EXTRUDE24_DEPTH, mode=Mode.SUBTRACT)

    # Sketch51 → Cut-Extrude25 (cut, through all)
    with BuildSketch(Plane(origin=(0, 8, 0), x_dir=(1, 0, 0), z_dir=(0, 1, 0))):
        with Locations((227.5, -3)):
            Rectangle(SKETCH51_W, SKETCH51_H)
    extrude(amount=-CUT_EXTRUDE25_DEPTH, mode=Mode.SUBTRACT)

    # Sketch52 → Cut-Extrude26 (cut, through all)
    with BuildSketch(Plane(origin=(0, 0, 6), x_dir=(-1, 0, 0), z_dir=(0, 0, -1))):
        with Locations((-223.5, 6.5)):
            Circle(SKETCH52_R)
        with Locations((-231.5, 6.5)):
            Circle(SKETCH52_R)
    extrude(amount=-CUT_EXTRUDE26_DEPTH, mode=Mode.SUBTRACT)

    # Fillet5
    fillet5_edges = [part.edges().sort_by_distance(p)[0] for p in [
        (300, 4, 29),
        (300, 4, -9),
    ]]
    fillet(fillet5_edges, radius=FILLET5_R)

    # Sketch54 → Boss-Extrude26 (add)
    with BuildSketch(Plane(origin=(0, 8, 0), x_dir=(1, 0, 0), z_dir=(0, 1, 0))):
        with Locations((284, 2.25)):
            Rectangle(SKETCH54_W, SKETCH54_H)
        with Locations((284, -22.25)):
            Rectangle(SKETCH54_W, SKETCH54_H)
    extrude(amount=BOSS_EXTRUDE26_DEPTH)

    # Fillet6
    fillet6_edges = [part.edges().sort_by_distance(p)[0] for p in [
        (284, 8, 4.5),
        (284, 8, 15.5),
    ]]
    fillet(fillet6_edges, radius=FILLET6_R)

    # Sketch55 → Cut-Extrude27 (cut, through all)
    with BuildSketch(Plane(origin=(0, 0, -9), x_dir=(-1, 0, 0), z_dir=(0, 0, -1))):
        with Locations((-288, 10.5)):
            Circle(SKETCH55_R)
        with Locations((-281, 10.5)):
            Circle(SKETCH55_R)
    extrude(amount=-CUT_EXTRUDE27_DEPTH, mode=Mode.SUBTRACT)

    # Fillet7
    fillet7_edges = [part.edges().sort_by_distance(p)[0] for p in [
        (274.5, 16, -2.25),
        (293.5, 16, -2.25),
        (274.5, 16, 22.25),
        (293.5, 16, 22.25),
    ]]
    fillet(fillet7_edges, radius=FILLET7_R)

    # Fillet8
    fillet8_edges = [part.edges().sort_by_distance(p)[0] for p in [
        (293.5, 8, 0.25),
        (293.5, 8, 19.75),
    ]]
    fillet(fillet8_edges, radius=FILLET8_R)

    # Fillet9
    fillet9_edges = [part.edges().sort_by_distance(p)[0] for p in [
        (274.5, 8, 0.25),
        (274.5, 8, 19.75),
    ]]
    fillet(fillet9_edges, radius=FILLET9_R)

    # Sketch56 → Cut-Extrude28 (cut)
    with BuildSketch(Plane(origin=(0, 16, 0), x_dir=(1, 0, 0), z_dir=(0, 1, 0))):
        with Locations((281, -13)):
            Rectangle(SKETCH56_W, SKETCH56_H)
        with Locations((288, -13)):
            Rectangle(SKETCH56_W, SKETCH56_H)
        with Locations((281, -7)):
            Rectangle(SKETCH56_W, SKETCH56_H)
        with Locations((288, -7)):
            Rectangle(SKETCH56_W, SKETCH56_H)
    extrude(amount=-CUT_EXTRUDE28_DEPTH, mode=Mode.SUBTRACT)


solid = part.part
